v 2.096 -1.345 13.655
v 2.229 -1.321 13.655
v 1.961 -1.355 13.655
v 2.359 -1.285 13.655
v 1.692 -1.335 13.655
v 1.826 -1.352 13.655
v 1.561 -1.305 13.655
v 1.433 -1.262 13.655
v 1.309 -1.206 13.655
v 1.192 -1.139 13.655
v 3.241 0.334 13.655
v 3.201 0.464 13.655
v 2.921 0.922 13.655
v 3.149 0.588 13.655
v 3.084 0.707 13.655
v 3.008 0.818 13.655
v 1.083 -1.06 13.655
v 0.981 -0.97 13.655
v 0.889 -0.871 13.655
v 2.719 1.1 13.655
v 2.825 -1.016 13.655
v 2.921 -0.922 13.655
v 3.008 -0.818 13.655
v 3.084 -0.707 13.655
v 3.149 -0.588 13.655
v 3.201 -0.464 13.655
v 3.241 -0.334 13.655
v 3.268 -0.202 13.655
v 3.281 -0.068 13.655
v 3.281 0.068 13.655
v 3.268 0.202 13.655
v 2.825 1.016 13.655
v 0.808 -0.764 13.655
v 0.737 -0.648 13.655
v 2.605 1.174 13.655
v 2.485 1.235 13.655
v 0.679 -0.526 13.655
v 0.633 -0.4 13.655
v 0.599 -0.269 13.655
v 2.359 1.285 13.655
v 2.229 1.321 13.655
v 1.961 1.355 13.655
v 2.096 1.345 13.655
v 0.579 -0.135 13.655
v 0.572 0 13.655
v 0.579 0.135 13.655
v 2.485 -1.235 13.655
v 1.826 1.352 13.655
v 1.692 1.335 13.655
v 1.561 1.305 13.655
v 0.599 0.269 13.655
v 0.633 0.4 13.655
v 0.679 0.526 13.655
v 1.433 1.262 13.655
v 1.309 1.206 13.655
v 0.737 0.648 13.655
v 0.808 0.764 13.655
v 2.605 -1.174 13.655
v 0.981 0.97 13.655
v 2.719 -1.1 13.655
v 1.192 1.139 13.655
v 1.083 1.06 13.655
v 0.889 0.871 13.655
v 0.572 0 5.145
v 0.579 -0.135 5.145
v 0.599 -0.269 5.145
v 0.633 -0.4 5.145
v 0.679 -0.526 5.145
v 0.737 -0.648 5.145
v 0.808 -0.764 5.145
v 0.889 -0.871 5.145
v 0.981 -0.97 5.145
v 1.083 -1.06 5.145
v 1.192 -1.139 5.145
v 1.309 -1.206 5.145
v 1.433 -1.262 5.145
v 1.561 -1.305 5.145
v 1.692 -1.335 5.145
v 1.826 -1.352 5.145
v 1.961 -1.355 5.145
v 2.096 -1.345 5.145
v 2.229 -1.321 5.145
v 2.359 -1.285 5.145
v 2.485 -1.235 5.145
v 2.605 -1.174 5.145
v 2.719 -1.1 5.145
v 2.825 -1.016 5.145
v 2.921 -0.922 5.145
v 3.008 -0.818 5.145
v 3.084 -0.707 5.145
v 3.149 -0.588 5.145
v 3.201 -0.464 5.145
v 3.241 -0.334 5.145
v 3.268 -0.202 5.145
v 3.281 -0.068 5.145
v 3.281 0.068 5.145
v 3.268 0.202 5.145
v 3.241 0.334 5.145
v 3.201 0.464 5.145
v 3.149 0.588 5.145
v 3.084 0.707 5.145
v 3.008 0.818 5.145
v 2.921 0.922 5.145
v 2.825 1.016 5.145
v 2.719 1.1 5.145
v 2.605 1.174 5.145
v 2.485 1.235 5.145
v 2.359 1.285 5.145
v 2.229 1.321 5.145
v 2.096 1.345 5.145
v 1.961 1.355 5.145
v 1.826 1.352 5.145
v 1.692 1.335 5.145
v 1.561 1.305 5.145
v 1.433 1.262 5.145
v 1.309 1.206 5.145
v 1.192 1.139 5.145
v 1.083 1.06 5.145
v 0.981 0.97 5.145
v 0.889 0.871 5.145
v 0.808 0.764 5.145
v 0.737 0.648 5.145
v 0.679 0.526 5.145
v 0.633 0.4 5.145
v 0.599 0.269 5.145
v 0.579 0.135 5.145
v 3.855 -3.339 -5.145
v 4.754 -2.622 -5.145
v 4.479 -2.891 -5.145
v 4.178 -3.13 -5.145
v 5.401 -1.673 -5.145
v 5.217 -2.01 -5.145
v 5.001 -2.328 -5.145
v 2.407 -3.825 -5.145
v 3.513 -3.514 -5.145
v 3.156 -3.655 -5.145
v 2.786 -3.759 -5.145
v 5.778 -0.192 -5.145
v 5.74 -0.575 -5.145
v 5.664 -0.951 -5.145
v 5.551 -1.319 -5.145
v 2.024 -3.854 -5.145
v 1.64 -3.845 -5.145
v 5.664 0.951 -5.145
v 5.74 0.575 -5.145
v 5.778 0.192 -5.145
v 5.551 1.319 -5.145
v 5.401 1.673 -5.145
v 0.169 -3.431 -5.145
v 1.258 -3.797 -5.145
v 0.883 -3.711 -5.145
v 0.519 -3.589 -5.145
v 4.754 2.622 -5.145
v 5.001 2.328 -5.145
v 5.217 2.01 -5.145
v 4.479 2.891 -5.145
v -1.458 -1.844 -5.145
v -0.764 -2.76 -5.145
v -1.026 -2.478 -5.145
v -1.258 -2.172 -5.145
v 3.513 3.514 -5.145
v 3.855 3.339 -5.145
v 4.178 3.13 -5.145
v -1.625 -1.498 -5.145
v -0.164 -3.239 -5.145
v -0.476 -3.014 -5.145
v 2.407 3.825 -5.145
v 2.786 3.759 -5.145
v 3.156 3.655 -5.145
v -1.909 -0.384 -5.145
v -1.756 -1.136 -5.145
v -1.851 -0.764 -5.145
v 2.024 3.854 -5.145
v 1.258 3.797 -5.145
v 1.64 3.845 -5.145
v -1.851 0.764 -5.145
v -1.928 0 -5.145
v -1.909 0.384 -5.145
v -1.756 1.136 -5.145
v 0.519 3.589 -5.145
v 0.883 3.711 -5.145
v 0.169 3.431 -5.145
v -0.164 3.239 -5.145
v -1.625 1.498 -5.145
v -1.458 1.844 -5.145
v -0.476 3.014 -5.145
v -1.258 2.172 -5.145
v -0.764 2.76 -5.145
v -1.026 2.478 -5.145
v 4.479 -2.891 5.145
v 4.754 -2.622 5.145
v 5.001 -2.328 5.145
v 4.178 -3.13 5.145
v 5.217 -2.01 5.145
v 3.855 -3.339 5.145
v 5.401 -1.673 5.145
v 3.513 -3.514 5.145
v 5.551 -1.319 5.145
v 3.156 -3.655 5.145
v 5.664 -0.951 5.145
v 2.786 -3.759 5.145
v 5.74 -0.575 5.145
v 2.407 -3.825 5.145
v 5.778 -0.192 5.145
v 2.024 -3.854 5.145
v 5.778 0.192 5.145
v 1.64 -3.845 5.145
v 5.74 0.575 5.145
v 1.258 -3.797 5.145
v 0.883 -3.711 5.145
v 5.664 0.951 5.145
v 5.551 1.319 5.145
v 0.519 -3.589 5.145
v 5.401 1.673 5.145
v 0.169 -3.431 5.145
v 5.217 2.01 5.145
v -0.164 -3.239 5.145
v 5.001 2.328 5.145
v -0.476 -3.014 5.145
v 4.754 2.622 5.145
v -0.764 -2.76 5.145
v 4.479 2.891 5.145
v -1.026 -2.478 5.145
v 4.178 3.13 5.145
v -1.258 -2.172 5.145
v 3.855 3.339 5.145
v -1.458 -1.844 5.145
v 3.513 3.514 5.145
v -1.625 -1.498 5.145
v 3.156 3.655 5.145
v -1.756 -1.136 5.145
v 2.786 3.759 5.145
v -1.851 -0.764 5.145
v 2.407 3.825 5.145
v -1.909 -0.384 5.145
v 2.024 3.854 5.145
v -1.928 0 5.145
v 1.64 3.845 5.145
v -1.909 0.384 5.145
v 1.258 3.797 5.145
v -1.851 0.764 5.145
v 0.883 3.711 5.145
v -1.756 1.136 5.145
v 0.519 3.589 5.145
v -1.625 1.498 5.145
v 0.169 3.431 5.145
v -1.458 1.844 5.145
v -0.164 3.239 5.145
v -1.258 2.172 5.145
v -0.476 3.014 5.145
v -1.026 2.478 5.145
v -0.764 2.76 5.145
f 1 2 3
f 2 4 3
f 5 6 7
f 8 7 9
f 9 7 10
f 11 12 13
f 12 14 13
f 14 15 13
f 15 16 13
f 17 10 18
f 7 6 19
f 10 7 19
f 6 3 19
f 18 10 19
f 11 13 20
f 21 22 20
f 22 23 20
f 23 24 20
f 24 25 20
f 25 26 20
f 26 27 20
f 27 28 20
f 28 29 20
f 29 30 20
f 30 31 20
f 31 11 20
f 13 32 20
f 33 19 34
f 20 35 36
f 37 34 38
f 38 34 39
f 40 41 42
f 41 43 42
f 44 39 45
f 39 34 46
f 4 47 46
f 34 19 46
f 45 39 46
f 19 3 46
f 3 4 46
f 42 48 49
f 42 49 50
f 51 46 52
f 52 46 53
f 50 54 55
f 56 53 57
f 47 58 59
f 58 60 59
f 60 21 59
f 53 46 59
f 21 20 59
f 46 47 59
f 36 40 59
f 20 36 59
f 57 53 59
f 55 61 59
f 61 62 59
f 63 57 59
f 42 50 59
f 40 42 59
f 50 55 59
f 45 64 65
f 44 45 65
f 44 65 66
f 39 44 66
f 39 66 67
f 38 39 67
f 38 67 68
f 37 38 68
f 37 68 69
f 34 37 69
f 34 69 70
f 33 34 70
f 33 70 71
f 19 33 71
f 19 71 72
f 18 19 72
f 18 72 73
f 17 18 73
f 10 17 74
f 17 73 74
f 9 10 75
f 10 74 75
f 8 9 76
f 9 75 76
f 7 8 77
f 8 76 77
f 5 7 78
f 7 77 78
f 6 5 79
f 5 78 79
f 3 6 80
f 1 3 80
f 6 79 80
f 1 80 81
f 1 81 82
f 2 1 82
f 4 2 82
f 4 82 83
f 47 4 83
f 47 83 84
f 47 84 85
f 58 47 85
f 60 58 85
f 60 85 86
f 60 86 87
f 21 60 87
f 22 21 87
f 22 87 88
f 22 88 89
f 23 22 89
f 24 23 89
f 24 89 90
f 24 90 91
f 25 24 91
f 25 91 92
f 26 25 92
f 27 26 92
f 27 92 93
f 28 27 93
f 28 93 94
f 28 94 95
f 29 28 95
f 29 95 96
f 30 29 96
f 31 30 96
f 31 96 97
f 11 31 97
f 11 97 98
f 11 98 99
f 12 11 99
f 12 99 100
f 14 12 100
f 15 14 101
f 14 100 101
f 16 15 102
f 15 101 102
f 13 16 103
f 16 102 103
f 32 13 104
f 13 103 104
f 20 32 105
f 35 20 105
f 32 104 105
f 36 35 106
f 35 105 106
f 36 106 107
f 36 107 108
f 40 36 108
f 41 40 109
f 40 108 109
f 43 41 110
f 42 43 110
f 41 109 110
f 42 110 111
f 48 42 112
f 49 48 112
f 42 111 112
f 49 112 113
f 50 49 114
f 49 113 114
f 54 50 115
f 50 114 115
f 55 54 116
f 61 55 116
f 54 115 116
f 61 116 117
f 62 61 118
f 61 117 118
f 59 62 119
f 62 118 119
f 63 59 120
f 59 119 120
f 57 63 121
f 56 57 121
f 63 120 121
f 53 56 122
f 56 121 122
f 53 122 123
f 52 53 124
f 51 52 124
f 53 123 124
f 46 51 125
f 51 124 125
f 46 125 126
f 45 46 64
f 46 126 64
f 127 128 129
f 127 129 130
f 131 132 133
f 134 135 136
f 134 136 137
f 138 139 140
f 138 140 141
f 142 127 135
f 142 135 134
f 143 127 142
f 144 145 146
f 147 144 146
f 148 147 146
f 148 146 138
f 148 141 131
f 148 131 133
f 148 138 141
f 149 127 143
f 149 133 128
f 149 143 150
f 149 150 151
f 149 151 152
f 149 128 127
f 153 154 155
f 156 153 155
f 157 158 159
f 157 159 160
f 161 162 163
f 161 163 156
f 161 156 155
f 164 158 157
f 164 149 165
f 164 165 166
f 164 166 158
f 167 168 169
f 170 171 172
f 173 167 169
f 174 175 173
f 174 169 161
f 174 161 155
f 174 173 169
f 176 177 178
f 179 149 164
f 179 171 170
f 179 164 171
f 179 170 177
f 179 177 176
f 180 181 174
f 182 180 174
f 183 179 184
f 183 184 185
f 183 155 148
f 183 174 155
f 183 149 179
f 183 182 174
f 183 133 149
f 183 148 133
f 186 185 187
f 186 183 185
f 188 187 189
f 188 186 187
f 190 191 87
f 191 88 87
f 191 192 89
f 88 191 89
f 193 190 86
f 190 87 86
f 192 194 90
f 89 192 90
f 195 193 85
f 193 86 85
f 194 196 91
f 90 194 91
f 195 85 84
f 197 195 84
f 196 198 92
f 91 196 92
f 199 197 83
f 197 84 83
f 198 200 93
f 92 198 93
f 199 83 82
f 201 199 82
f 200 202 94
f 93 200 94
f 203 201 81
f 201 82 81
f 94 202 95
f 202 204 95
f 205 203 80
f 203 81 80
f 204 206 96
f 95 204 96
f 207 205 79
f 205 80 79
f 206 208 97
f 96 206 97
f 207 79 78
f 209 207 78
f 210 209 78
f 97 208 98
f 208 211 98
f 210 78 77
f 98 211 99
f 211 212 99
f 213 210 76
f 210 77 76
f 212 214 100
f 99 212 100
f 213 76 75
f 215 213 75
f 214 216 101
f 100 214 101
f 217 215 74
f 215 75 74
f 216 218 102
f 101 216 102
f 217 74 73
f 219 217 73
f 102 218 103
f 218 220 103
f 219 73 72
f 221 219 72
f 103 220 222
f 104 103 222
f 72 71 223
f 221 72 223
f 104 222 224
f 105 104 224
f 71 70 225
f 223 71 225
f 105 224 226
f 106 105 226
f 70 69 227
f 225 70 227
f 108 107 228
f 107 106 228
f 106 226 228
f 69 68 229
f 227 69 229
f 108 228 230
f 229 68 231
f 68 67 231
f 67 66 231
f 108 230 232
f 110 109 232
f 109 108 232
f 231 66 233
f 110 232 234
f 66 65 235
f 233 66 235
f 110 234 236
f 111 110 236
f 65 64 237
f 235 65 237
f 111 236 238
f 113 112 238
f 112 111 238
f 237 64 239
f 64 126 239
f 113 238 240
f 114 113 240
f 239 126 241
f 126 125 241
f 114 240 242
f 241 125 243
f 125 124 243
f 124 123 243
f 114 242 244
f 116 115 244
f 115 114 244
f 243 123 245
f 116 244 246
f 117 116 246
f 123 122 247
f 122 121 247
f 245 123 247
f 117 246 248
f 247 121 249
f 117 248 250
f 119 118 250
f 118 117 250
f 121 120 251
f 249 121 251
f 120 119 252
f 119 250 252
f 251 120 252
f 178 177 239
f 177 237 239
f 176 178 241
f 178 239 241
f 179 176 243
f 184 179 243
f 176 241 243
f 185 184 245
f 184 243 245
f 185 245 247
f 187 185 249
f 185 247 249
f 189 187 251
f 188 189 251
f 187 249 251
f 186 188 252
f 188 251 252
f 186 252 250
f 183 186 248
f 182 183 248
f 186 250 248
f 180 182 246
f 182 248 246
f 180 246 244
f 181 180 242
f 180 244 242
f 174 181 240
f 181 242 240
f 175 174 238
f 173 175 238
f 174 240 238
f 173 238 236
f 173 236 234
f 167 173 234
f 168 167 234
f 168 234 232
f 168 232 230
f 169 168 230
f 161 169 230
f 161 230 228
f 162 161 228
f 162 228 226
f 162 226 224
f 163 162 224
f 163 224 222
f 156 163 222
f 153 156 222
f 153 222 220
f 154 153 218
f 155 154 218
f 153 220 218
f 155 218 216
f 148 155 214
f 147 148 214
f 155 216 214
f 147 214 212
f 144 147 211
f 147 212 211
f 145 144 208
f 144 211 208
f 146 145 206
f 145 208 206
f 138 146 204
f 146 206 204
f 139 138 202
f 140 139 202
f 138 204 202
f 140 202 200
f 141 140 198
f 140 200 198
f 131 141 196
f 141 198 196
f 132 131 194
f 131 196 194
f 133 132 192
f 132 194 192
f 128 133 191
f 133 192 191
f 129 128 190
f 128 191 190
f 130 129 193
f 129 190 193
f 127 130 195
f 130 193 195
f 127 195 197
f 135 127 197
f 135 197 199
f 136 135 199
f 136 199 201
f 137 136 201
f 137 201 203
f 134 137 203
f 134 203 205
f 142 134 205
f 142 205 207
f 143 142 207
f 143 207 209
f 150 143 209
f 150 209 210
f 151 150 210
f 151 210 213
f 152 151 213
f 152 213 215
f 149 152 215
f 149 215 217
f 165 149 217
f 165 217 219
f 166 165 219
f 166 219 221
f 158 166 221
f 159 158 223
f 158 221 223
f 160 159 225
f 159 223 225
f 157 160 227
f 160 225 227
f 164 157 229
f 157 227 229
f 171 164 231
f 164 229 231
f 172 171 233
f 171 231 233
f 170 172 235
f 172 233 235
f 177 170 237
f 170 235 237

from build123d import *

# Parameters (mm, degrees)
F0_W     = 3.8553732447
F0_H     = 10.2907596156
F2_T     = -2.5
F3_DEPTH = 16.3


with BuildPart() as f1:
    # F0 (on Front) → F1 (revolve)
    with BuildSketch(Plane.XZ):
        Rectangle(F0_W, F0_H)
    revolve(axis=Axis((1.9276866224, 0, 0), (0, 0, -1)))

    # F2
    f2_openings = [f1.faces().sort_by_distance(p)[0] for p in [
        (1.927687, 0, 5.14538),
    ]]
    offset(amount=F2_T, openings=f2_openings)

    # F3 (add): a face of the model
    f3_faces = [f1.faces().sort_by_distance(p)[0] for p in [
        (1.9276866224, 0, -2.6453798078),
    ]]
    extrude(f3_faces, amount=F3_DEPTH)


solid = f1.part
